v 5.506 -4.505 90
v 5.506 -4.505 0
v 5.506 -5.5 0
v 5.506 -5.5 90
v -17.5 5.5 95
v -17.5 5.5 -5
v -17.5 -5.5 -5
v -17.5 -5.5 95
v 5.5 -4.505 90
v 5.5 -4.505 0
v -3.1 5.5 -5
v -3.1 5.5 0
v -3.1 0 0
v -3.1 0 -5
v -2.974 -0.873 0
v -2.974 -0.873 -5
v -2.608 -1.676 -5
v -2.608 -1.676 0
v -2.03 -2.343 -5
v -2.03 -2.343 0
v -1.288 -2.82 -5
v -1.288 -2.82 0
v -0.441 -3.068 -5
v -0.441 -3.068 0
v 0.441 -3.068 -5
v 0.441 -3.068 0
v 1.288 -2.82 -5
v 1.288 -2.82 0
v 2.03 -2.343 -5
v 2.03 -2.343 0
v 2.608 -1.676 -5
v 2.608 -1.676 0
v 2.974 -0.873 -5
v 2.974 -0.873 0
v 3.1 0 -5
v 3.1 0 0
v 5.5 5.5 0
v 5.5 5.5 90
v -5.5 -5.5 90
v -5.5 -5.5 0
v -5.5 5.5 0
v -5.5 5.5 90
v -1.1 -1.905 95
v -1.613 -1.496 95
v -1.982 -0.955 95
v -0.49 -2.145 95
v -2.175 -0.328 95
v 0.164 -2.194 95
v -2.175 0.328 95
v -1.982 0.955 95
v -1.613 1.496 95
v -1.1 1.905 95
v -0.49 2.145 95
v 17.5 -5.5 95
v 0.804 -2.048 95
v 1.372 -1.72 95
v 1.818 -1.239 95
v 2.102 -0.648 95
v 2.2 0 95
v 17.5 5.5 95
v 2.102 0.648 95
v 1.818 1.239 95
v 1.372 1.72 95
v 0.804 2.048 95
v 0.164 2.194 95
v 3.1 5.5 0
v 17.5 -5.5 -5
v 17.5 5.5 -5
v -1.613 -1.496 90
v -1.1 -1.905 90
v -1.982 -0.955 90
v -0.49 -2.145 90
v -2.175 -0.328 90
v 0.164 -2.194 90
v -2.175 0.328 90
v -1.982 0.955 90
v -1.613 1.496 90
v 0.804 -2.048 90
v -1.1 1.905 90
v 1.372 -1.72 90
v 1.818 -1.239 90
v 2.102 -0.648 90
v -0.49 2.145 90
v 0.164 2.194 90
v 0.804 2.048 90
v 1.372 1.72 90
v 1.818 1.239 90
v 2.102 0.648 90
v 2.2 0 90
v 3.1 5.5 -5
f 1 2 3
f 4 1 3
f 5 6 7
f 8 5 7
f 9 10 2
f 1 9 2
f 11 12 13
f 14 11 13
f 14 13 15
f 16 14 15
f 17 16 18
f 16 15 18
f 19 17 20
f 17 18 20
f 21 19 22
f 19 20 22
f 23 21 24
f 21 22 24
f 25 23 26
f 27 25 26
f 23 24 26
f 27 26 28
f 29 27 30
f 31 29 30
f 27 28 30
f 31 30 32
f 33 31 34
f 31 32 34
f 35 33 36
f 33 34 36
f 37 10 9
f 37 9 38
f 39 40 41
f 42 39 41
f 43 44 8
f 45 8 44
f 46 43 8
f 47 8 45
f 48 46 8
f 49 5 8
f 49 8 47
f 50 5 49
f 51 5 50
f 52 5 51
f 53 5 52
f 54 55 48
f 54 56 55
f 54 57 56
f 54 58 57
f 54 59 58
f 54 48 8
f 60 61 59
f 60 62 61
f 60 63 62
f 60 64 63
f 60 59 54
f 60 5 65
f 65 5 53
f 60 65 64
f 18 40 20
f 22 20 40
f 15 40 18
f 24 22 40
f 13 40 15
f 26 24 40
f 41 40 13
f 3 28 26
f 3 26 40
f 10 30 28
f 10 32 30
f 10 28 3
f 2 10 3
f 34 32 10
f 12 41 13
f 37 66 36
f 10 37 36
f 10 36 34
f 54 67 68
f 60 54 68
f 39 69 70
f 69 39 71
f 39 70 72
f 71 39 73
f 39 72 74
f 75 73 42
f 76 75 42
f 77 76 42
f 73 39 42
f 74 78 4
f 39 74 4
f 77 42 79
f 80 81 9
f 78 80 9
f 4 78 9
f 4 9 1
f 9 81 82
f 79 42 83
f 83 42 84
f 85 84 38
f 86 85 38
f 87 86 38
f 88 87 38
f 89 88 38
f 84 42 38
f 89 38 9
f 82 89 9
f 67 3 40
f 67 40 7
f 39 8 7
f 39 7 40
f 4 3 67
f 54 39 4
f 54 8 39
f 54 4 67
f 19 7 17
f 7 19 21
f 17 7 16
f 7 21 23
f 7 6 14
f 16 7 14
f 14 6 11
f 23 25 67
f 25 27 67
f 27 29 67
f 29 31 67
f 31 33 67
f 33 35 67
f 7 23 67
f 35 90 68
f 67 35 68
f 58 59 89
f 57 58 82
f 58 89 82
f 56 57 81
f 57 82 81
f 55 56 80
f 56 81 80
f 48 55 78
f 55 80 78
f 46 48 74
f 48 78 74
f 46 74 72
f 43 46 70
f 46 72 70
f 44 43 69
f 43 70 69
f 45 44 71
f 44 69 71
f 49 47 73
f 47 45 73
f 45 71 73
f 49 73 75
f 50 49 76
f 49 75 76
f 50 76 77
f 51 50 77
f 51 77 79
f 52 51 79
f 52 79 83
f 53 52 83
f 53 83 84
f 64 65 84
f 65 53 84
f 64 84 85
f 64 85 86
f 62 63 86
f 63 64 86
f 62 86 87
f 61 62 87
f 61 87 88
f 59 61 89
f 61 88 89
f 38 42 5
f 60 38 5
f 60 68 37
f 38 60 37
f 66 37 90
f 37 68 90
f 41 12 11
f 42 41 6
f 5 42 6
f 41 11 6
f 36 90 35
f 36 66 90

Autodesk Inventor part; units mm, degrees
ref_plane "YZ Plane" through (0, 0, 0) normal (1, 0, 0) x (0, 1, 0)
ref_plane "XZ Plane" through (0, 0, 0) normal (0, 1, 0) x (-1, 0, 0)
ref_plane "XY Plane" through (0, 0, 0) normal (0, 0, 1) x (1, 0, 0)
sketch "Sketch1" plane through (0, 0, 0) normal (0, 0, 1) x (1, 0, 0)
  arc A0 (-3.1, 0) -> (3.1, 0) centre (0, 0) ccw
  arc A1 (-5.5, 0) -> (5.5, 0) centre (0, 0) ccw
  line L0 (-3.1, 0) -> (-5.5, 0)
  line L1 (-5.5, 0) -> (-5.5, 5.5)
  line L2 (-5.5, 5.5) -> (-3.1, 5.5)
  line L3 (-3.1, 5.5) -> (-3.1, 0)
  line L4 (3.1, 0) -> (5.5, 0)
  line L5 (5.5, 0) -> (5.5, 5.5)
  line L6 (5.5, 5.5) -> (3.1, 5.5)
  line L7 (3.1, 5.5) -> (3.1, 0)
  line L8 (-5.5, 0) -> (-5.5, 5.5)
  line L9 (-5.5, 5.5) -> (-17.5, 5.5)
  line L10 (-17.5, 5.5) -> (-17.5, 0)
  line L11 (-17.5, 0) -> (-5.5, 0)
  line L12 (5.5, 0) -> (5.5, 5.5)
  line L13 (5.5, 5.5) -> (17.5, 5.5)
  line L14 (17.5, 5.5) -> (17.5, 0)
  line L15 (17.5, 0) -> (5.5, 0)
  line L16 (17.5, 0) -> (17.5, -5.5)
  line L17 (17.5, -5.5) -> (-17.5, -5.5)
  line L18 (-17.5, -5.5) -> (-17.5, 0)
  dimension "d0" = 6.2
  dimension "d1" = 11
  dimension "d2" = 12
  dimension "d3" = 12
extrude "Extr-legs" add sketch "Sketch1" along normal blind 90 contours L11 L10 L9 L1 | L5 L13 L14 L15
extrude "Extr-base" add sketch "Sketch1" against normal blind 5 contours A0 L4 A1 L0 | L0 L1 L2 L3 | L7 L6 L5 L4 | L11 L10 L9 L1 | L5 L13 L14 L15
sketch "Sketch2" plane through (0, 0, 90) normal (0, 0, 1) x (1, 0, 0)
  circle A0 centre (0, 0) radius 2.2
  circle A1 centre (0, 0) radius 4.5
  line L0 (5.5, 0) -> (17.5, 0) projected
  line L1 (-17.5, 0) -> (-5.5, 0) projected
  line L2 (-17.5, 0) -> (-17.5, 5.5)
  line L3 (-17.5, 5.5) -> (17.5, 5.5)
  line L4 (17.5, 5.5) -> (17.5, 0)
  line L5 (17.5, 0) -> (2.2, 0)
  line L6 (-2.2, 0) -> (-17.5, 0)
  line L7 (-17.5, 0) -> (-17.5, -4.5048)
  line L8 (-17.5, -4.5048) -> (17.5, -4.5048)
  line L9 (17.5, -4.5048) -> (17.5, 0)
  line L10 (17.5, 0) -> (5.5, 0) projected
  line L11 (17.5, 0) -> (-1.5, 0)
  line L12 (-1.5, 0) -> (-1.5, -4.5048)
  line L13 (-1.5, -4.5048) -> (17.5, -4.5048)
  line L14 (17.5, -4.5048) -> (17.5, 0)
  line L15 (-17.5, 0) -> (-12.5, 0)
  line L16 (-12.5, 0) -> (-12.5, -4.5048)
  line L17 (-12.5, -4.5048) -> (-17.5, -4.5048)
  line L18 (-17.5, -4.5048) -> (-17.5, 0)
  dimension "d8" = 4.4
  dimension "d9" = 9
extrude "Extr-top" add sketch "Sketch2" along normal blind 5 contours L5 A1 L12 A0 | A0 L6 A1 L5 | A0 L12 A1 L6 | L5 L0 L9 L8 L12 A1 | A1 L6 L1 L2 L3 L4 L0 L5 | A1 L12 L8 L16 L1 L6 | L16 L8 L7 L1
extrude "Extrusion4" add sketch "Sketch1" against normal up to surface (5 mm away) contours A1 L17 L18 L11 | L15 L16 L17 A1
sketch "Sketch3" plane through (0, 0, 90) normal (0, 0, -1) x (-1, 0, 0)
  line L0 (-5.5, 0) -> (-17.5, 0) projected
  line L1 (-17.5, -4.5048) -> (-17.5, 0) projected
  line L2 (17.5, -4.5048) -> (-17.5, -4.5048) projected
  line L3 (17.5, 0) -> (17.5, -4.5048) projected
  line L4 (17.5, 0) -> (5.5, 0) projected
  line L5 (5.5, 0) -> (5.5, 5.5) projected
  line L6 (-5.5, 5.5) -> (5.5, 5.5) projected
  line L7 (-5.5, 5.5) -> (-5.5, 0) projected
  circle A0 centre (0, 0) radius 2.2 projected
  line L8 (17.5, -4.5048) -> (-17.5, -4.5048) projected
  line L9 (-17.5, 0) -> (-5.5, 0)
  line L10 (-5.5, 0) -> (-5.5, -4.5048)
  line L11 (-5.5, -4.5048) -> (-17.5, -4.5048)
  line L12 (-17.5, -4.5048) -> (-17.5, 0)
  line L13 (17.5, 0) -> (5.5, 0) projected
  line L14 (5.5, 0) -> (17.5, 0)
  line L15 (17.5, 0) -> (17.5, -4.5048)
  line L16 (17.5, -4.5048) -> (5.5, -4.5048)
  line L17 (5.5, -4.5048) -> (5.5, 0)
extrude "Extrusion5" add sketch "Sketch3" along normal up to next contours L10 L2 L1 L0 | L17 L4 L3 L2
sketch "Sketch4" plane through (0, 0, 0) normal (0, 0, 1) x (1, 0, 0)
  line L0 (-17.5, -5.5) -> (17.5, -5.5) projected
  line L1 (-5.5, -4.5048) -> (-17.5, -4.5048) projected
  line L2 (-17.5, -5.5) -> (-5.5, -5.5)
  line L3 (-5.5, -5.5) -> (-5.5, -4.5048)
  line L4 (-5.5, -4.5048) -> (-17.5, -4.5048)
  line L5 (-17.5, -4.5048) -> (-17.5, -5.5)
  line L6 (17.5, -4.5048) -> (5.5, -4.5048) projected
  line L7 (-17.5, -5.5) -> (17.5, -5.5) projected
  line L8 (17.5, -4.5048) -> (5.5064, -4.5048)
  line L9 (5.5064, -4.5048) -> (5.5064, -5.5)
  line L10 (5.5064, -5.5) -> (17.5, -5.5)
  line L11 (17.5, -5.5) -> (17.5, -4.5048)
  point P0 (0, 0)
extrude "Extrusion6" add sketch "Sketch4" along normal up to surface (95 mm away)
sketch "Sketch5" plane through (0, 0, 95) normal (0, 0, 1) x (1, 0, 0)
  line L0 (-5.5, -4.5048) -> (5.5, -4.5048) projected
  line L1 (-17.5, -5.5) -> (17.5, -5.5) projected
  line L2 (-5.5, -4.5048) -> (5.516, -4.5048)
  line L3 (5.516, -4.5048) -> (5.516, -5.5)
  line L4 (5.516, -5.5) -> (-5.5, -5.5)
  line L5 (-5.5, -5.5) -> (-5.5, -4.5048)
  point P0 (0, 0)
extrude "Extrusion7" add sketch "Sketch5" against normal up to surface (5 mm away)
properties part number "cage2table-mount-M4(top)-M6(bottom)-H100mm"
